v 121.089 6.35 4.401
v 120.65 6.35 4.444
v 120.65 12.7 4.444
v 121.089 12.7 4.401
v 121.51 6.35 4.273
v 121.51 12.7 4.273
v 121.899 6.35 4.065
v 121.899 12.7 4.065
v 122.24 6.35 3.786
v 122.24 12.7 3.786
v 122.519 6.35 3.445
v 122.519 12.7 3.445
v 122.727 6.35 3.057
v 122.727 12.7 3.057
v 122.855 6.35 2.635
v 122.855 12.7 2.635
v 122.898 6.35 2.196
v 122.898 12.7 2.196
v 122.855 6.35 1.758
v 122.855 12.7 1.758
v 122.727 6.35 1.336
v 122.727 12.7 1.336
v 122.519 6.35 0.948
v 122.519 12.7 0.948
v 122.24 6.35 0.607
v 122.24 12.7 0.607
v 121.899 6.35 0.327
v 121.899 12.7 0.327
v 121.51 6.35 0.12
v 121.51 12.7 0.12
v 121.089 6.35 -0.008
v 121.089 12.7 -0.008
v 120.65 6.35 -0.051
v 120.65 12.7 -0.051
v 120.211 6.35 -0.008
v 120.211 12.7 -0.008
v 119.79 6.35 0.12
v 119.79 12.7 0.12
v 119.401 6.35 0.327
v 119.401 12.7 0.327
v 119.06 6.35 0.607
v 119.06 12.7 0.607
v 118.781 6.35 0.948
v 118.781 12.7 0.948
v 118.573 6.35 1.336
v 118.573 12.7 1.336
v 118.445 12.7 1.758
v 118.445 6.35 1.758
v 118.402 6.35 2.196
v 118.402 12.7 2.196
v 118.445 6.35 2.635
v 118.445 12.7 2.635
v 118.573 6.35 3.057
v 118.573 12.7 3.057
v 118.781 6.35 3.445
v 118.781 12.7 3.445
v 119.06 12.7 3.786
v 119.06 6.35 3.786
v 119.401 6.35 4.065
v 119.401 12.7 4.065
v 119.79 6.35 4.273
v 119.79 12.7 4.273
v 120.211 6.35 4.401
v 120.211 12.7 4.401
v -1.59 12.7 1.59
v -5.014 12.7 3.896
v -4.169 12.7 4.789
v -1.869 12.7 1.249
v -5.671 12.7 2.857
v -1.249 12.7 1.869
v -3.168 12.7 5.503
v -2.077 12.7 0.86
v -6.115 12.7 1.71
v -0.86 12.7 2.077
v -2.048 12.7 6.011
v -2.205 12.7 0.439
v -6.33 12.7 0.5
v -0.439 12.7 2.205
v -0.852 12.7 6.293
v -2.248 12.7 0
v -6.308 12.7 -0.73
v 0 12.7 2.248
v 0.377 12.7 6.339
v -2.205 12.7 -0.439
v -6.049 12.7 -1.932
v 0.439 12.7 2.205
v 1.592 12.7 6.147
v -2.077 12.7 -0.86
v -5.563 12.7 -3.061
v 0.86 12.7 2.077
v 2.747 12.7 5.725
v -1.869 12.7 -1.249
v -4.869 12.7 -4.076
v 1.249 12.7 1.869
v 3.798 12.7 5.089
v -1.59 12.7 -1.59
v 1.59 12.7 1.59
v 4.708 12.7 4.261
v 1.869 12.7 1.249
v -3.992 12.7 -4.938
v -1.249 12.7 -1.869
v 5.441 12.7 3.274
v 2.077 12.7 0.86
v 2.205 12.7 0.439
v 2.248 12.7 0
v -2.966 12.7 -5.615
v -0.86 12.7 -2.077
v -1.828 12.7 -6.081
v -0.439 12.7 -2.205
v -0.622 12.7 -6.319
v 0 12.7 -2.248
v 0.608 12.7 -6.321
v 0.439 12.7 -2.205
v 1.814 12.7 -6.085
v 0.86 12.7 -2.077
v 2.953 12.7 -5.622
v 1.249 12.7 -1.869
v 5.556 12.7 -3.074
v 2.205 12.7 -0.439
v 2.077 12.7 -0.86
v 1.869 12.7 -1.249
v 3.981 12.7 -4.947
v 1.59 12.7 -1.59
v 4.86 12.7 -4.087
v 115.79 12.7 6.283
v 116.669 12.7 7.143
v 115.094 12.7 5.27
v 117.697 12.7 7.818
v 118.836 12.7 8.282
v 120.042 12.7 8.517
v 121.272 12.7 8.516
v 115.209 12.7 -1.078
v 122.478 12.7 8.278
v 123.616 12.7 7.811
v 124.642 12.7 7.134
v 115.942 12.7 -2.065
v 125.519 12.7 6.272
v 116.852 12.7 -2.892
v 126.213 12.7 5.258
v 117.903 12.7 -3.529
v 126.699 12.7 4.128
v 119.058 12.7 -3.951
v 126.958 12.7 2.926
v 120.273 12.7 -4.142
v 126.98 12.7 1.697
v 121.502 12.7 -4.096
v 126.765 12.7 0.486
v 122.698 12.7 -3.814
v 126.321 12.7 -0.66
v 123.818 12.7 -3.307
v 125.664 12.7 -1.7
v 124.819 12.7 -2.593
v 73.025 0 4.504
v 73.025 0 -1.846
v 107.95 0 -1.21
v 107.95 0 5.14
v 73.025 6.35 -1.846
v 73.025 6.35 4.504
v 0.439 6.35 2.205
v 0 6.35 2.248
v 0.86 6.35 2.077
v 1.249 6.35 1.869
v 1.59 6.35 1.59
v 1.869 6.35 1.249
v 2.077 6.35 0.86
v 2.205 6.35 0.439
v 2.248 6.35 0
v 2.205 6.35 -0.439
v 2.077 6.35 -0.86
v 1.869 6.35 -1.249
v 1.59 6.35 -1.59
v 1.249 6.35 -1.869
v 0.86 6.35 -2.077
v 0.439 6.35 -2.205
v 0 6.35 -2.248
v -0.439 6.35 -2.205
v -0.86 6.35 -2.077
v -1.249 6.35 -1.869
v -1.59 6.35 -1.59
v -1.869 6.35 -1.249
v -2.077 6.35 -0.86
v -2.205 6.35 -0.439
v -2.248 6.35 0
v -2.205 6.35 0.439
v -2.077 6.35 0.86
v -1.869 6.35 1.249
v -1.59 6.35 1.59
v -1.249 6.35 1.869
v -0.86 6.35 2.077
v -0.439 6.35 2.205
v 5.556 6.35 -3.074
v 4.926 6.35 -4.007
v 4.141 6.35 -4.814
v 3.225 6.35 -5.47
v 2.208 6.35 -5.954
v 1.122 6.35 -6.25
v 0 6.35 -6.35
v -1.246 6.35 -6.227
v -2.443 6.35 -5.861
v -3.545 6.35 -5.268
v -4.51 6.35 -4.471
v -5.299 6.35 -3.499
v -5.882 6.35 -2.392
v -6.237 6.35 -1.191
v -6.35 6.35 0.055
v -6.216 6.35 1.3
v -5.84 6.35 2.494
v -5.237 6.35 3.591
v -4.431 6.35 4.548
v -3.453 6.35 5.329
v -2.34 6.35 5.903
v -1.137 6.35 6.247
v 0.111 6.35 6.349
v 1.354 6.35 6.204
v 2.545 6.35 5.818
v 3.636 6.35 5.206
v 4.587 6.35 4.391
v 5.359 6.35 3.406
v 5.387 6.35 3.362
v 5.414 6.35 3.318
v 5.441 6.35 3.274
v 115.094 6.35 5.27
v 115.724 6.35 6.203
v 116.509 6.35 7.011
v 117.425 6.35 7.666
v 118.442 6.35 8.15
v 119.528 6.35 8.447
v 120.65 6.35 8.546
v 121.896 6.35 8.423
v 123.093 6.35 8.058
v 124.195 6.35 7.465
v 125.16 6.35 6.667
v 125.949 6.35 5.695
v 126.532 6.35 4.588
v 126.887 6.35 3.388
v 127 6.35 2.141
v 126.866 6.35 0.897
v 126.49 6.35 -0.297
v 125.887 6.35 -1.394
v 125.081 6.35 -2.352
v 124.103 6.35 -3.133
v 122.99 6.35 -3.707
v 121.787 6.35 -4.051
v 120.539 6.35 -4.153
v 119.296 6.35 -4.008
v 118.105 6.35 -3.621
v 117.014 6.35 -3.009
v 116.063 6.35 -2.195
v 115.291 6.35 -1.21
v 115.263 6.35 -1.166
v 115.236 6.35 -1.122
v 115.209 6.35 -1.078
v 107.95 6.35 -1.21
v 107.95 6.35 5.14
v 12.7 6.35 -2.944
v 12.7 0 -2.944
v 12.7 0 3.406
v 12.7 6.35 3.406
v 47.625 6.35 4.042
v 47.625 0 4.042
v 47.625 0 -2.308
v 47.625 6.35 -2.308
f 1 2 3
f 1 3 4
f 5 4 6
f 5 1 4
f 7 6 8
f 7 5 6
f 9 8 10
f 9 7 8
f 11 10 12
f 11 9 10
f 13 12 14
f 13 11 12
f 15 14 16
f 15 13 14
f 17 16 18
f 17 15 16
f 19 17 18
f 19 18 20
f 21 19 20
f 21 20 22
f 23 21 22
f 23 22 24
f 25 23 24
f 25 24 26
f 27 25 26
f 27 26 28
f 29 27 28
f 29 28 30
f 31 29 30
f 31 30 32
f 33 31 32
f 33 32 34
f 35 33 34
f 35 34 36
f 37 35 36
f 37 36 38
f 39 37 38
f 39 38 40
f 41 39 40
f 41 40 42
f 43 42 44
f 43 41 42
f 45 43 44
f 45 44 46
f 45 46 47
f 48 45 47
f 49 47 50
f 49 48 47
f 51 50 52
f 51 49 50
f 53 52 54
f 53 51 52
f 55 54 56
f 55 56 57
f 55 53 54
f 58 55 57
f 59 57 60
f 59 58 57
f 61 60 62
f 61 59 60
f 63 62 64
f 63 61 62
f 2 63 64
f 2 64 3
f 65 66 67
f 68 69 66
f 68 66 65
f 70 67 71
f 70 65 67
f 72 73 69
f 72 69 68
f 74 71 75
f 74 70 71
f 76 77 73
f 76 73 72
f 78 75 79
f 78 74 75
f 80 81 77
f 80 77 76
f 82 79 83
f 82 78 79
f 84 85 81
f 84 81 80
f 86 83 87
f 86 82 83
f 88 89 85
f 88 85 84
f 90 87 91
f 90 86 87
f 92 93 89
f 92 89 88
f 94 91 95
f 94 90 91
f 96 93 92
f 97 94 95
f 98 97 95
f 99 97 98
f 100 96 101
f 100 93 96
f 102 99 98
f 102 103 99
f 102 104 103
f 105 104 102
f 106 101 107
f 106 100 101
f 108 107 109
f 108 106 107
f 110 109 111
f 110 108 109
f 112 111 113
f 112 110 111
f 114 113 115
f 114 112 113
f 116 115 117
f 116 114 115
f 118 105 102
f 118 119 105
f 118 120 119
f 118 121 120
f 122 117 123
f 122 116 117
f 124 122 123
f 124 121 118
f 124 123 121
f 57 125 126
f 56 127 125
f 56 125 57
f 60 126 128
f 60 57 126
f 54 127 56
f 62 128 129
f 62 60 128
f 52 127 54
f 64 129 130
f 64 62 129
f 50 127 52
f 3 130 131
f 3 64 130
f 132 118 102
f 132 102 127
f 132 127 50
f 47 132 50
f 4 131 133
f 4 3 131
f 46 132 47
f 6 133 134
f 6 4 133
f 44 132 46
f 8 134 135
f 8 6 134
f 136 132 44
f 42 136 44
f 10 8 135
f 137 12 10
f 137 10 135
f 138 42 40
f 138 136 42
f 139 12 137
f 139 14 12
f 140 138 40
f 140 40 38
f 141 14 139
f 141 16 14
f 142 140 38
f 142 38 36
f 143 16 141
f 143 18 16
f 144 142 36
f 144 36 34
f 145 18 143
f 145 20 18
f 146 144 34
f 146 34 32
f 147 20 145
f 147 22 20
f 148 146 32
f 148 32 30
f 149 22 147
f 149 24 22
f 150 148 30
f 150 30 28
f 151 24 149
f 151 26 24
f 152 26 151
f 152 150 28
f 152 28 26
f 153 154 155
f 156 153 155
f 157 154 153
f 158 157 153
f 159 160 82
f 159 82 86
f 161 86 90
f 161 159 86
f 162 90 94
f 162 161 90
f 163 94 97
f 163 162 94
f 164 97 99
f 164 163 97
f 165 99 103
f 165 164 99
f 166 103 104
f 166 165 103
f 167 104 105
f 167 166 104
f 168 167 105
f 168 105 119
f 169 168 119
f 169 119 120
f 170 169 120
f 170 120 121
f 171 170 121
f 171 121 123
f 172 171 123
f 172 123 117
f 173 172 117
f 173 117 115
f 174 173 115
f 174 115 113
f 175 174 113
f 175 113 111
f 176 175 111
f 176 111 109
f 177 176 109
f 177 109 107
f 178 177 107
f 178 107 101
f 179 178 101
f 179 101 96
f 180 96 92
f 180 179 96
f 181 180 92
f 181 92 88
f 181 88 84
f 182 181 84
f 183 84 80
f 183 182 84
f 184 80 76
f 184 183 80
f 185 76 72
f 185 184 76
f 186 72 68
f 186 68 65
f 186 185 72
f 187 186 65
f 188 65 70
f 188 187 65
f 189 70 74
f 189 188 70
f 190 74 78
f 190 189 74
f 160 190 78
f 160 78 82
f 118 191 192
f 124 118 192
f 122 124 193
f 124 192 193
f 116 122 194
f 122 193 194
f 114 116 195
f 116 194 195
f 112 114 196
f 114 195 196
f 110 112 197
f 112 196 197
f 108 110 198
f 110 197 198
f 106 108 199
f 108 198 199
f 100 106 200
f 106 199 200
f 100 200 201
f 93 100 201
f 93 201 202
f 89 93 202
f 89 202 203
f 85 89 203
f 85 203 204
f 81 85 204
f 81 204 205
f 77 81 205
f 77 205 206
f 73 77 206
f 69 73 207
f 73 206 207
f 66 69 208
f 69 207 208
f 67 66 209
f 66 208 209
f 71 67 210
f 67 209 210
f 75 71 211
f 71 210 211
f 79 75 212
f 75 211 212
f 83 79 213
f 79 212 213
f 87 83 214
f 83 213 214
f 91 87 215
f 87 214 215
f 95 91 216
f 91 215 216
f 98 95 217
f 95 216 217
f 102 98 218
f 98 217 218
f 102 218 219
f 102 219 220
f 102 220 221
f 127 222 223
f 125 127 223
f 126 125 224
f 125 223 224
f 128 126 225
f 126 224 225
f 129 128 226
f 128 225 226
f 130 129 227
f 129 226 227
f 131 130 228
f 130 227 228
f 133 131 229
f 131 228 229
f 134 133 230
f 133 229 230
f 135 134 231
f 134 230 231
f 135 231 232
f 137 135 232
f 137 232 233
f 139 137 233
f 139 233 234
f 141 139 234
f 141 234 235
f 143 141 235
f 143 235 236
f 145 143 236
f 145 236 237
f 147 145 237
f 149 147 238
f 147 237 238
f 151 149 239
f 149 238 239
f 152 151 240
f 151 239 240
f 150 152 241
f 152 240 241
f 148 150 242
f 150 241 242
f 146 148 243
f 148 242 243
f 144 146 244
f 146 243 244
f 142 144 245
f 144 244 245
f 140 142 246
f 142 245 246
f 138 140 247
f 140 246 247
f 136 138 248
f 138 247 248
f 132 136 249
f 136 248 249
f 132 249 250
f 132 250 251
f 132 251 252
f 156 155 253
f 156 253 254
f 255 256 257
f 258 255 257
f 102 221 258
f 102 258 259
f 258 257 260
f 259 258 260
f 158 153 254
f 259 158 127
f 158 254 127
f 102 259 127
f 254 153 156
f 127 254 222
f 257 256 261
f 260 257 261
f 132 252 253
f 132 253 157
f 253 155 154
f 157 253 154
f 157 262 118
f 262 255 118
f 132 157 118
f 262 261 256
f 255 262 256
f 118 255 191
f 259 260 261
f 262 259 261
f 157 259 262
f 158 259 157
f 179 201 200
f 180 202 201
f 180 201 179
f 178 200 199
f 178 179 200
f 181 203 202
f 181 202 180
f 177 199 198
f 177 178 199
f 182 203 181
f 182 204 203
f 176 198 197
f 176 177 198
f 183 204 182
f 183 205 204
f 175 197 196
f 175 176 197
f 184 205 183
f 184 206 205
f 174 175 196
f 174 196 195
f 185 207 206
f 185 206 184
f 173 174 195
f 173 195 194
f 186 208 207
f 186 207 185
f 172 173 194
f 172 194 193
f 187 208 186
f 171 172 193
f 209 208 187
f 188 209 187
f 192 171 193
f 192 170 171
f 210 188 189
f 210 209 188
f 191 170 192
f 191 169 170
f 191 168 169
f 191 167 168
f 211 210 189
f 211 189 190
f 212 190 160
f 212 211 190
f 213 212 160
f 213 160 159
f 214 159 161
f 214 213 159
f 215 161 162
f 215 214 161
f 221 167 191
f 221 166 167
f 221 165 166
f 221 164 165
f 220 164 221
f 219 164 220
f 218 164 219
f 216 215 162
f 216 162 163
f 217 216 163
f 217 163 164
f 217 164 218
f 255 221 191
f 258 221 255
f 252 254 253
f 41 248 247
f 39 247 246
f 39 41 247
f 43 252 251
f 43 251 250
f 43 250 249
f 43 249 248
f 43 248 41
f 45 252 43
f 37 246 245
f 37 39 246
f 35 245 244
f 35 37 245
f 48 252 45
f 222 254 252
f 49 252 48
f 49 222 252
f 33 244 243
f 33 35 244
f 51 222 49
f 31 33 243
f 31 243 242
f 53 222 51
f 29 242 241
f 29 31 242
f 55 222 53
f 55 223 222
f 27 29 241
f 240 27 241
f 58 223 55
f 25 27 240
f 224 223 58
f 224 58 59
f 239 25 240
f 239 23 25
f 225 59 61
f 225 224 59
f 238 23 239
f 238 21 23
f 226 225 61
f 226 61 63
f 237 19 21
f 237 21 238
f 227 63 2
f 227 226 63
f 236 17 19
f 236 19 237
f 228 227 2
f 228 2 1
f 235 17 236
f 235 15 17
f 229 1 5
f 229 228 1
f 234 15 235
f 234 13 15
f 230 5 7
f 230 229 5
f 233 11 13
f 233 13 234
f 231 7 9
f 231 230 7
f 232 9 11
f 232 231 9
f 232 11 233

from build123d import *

# Parameters (mm, degrees)
SKETCH2_R           = 2.2479
BOSS_EXTRUDE2_DEPTH = 12.7
SKETCH3_R           = 6.35
SKETCH3_W           = 12.7
SKETCH3_H           = 9.756200869
SKETCH3_H_2         = 9.756200868
CUT_EXTRUDE1_DEPTH  = 6.35
CUT_EXTRUDE2_DEPTH  = 6.35


with BuildPart() as part:
    # Sketch2 → Boss-Extrude2 (new body)
    with BuildSketch(Plane(origin=(0, 0, 0), x_dir=(1, 0, 0), z_dir=(0, 1, 0))):
        with BuildLine():
            ThreePointArc((5.556434937, 3.073846253), (-6.34894802, 0.115581283), (5.440872802, -3.274049962))
            Line((5.440872802, -3.274049962), (115.093565063, -5.270254505))
            ThreePointArc((115.093565063, -5.270254505), (126.99894802, -2.311989535), (115.209127198, 1.07764171))
            Line((115.209127198, 1.07764171), (5.556434937, 3.073846253))
        make_face()
        with Locations(Location((120.65, -2.196408252, 0), (0, 0, 270))):
            Circle(SKETCH2_R, mode=Mode.SUBTRACT)
        with Locations(Location((0, 0, 0), (0, 0, 270))):
            Circle(SKETCH2_R, mode=Mode.SUBTRACT)
    extrude(amount=BOSS_EXTRUDE2_DEPTH)

    # Sketch3 → Cut-Extrude1 (cut)
    with BuildSketch(Plane.XZ):
        Circle(SKETCH3_R)
        with Locations((120.65, 2.196408252)):
            Circle(SKETCH3_R)
        with Locations((6.35, -1.471899566)):
            Rectangle(SKETCH3_W, SKETCH3_H)
        with Locations((114.3, 3.668307818)):
            Rectangle(SKETCH3_W, SKETCH3_H_2)
    extrude(amount=-CUT_EXTRUDE1_DEPTH, mode=Mode.SUBTRACT)

    # Sketch4 → Cut-Extrude2 (cut)
    with BuildSketch(Plane.XZ):
        Polygon((47.625, 4.042003257), (47.625, -2.307996743), (73.025, -1.845595005), (73.025, 4.504404995), align=None)
    extrude(amount=-CUT_EXTRUDE2_DEPTH, mode=Mode.SUBTRACT)


solid = part.part
